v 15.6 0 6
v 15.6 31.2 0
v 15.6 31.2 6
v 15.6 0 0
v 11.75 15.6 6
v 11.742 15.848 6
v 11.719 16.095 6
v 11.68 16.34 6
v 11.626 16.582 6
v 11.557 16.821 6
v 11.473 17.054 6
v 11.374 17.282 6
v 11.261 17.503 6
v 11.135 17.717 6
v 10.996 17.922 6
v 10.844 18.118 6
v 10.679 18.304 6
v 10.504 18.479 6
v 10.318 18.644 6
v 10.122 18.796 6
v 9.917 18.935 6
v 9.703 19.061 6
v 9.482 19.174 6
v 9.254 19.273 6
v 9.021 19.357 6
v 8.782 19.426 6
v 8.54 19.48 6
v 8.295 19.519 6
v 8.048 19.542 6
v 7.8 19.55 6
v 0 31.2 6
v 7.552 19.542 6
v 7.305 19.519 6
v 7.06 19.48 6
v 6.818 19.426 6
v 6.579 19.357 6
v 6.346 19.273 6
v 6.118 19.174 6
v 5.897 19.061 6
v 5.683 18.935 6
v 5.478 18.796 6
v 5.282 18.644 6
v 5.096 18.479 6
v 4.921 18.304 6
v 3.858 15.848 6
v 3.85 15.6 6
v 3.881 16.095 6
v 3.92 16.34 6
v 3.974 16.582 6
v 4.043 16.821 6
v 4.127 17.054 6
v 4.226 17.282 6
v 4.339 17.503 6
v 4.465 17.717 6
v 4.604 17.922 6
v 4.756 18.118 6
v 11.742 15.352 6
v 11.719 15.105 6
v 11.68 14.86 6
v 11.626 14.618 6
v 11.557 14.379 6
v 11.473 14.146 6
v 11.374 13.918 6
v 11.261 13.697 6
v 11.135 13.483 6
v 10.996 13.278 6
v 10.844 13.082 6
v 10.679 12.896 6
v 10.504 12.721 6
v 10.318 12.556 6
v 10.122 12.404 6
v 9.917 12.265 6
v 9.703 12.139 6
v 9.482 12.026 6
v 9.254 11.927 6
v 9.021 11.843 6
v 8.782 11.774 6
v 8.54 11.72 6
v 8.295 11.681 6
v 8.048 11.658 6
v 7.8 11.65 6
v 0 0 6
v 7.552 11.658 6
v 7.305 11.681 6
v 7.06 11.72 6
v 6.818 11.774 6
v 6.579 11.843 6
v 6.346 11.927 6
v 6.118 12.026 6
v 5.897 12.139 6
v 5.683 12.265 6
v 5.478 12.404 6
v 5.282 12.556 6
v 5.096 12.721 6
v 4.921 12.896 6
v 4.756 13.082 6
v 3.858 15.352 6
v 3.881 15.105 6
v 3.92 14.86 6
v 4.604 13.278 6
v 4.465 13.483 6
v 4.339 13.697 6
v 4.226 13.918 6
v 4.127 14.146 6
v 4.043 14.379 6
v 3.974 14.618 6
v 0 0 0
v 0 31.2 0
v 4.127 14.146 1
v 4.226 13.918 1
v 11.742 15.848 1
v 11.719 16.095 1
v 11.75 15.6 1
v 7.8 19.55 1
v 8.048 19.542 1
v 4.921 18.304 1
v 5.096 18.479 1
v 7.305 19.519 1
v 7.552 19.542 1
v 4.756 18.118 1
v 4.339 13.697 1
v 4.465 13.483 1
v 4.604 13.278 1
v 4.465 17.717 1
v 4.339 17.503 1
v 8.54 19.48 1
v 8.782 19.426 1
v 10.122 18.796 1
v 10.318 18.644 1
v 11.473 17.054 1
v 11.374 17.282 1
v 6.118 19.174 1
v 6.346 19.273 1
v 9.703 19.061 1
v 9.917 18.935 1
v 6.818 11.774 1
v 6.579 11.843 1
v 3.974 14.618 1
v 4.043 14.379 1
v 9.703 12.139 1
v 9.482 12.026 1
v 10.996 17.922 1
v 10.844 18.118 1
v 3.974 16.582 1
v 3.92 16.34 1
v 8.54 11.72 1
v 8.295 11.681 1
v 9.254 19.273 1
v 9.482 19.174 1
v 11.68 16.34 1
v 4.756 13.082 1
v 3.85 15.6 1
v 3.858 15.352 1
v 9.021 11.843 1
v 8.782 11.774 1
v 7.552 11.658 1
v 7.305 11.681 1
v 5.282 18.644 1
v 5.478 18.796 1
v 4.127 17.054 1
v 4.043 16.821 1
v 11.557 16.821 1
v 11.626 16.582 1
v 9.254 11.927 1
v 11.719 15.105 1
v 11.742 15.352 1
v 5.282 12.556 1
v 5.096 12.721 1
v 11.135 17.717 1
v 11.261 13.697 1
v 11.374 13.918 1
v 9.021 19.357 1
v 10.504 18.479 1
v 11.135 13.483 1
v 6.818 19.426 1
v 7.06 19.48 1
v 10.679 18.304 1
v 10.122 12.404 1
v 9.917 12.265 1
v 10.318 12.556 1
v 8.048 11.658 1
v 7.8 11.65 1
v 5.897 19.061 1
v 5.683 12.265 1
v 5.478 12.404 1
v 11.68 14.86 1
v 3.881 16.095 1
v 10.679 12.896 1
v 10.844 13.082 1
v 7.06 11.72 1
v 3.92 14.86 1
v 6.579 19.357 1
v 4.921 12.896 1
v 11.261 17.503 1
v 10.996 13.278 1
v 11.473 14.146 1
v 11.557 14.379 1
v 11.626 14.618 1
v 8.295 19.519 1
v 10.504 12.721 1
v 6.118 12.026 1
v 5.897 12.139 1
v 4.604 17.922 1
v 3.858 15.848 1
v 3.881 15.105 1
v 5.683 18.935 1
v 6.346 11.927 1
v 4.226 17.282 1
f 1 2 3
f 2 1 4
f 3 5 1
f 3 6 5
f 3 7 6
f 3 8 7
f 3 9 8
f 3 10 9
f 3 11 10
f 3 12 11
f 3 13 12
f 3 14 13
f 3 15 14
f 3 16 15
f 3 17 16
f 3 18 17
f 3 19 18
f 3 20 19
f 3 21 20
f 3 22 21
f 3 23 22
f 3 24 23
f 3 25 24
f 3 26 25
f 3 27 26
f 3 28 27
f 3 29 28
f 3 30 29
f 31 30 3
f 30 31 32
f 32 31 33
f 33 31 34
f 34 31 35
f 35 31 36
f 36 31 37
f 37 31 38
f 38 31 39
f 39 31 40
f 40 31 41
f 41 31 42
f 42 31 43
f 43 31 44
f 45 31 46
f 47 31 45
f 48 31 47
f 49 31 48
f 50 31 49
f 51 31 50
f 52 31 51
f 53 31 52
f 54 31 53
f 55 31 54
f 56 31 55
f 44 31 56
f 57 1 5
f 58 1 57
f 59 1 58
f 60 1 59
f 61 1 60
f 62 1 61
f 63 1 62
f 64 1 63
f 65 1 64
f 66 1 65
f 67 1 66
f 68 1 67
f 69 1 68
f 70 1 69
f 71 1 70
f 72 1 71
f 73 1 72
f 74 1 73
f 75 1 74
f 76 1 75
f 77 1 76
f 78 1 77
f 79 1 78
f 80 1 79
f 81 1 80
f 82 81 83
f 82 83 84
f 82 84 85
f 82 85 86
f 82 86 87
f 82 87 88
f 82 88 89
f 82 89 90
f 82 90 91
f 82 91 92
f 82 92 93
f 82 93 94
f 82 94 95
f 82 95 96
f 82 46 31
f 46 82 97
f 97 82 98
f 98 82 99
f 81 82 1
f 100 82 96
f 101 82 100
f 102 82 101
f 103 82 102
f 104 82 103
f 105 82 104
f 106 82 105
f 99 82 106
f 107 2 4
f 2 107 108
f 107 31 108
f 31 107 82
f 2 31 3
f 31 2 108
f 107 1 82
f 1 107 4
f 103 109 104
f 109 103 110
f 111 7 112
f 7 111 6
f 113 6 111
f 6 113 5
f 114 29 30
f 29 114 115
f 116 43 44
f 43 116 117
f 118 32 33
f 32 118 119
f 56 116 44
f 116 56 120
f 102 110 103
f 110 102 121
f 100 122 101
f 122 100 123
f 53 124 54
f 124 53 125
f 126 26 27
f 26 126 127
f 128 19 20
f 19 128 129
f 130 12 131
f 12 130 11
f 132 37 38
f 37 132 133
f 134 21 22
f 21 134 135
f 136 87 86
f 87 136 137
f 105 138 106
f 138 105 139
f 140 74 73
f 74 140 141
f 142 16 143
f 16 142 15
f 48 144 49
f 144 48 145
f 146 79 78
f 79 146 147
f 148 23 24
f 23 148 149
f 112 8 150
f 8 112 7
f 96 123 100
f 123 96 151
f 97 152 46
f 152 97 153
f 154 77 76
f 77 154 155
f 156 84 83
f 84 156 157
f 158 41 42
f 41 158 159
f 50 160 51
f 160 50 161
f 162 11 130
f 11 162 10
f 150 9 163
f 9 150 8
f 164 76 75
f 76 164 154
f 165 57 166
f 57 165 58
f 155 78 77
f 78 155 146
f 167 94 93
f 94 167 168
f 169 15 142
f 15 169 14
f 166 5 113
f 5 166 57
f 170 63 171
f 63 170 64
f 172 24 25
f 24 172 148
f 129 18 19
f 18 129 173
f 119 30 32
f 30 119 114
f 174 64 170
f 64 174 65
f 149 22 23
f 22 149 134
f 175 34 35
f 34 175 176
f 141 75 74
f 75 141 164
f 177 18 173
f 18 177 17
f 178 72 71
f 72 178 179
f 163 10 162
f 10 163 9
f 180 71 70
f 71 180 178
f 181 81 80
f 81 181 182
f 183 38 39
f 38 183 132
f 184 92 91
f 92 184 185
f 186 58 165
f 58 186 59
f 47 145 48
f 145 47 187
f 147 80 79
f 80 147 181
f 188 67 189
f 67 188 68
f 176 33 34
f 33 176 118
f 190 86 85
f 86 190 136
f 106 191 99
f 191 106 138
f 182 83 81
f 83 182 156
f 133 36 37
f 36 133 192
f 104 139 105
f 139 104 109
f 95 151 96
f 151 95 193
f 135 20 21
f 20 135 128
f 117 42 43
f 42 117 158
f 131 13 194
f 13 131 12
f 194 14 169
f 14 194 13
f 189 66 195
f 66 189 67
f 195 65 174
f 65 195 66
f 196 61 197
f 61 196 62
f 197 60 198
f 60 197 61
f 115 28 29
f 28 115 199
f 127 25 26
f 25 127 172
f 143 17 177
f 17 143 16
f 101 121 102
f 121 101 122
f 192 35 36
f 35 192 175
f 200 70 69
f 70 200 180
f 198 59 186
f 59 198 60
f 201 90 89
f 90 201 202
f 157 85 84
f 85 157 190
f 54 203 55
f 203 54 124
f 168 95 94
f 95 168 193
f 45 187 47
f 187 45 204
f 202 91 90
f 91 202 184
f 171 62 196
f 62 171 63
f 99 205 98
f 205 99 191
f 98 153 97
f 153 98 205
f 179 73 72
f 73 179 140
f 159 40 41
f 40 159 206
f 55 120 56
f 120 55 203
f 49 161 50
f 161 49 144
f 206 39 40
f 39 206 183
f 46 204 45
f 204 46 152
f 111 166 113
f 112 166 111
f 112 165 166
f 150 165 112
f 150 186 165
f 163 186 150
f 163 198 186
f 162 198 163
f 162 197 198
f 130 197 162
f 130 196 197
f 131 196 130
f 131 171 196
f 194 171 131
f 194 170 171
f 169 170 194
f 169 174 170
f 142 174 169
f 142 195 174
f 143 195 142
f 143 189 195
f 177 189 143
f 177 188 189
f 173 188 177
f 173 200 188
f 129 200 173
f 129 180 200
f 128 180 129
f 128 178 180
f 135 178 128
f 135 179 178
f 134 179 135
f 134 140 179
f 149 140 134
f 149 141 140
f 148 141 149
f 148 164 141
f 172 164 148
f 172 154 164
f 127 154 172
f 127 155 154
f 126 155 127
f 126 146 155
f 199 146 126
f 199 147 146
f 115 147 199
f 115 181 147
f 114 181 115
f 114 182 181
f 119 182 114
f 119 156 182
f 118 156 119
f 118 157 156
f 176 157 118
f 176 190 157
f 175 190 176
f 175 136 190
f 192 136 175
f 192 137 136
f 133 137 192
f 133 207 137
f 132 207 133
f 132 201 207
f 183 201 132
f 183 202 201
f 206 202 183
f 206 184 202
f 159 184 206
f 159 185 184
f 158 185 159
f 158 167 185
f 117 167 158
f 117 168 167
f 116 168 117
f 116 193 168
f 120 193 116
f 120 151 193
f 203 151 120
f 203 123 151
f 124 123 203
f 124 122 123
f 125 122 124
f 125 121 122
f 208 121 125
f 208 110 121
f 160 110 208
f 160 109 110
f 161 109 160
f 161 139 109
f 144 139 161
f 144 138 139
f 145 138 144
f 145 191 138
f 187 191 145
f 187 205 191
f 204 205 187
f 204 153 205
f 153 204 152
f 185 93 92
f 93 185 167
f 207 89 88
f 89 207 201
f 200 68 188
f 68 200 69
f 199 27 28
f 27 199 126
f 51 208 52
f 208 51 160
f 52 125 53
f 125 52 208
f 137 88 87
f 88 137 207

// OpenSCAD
Width = 18.50;
Length = Width;
ScrewDiameter = 7.9;
SpacerWidth = 15.6; //Changed for SpacerJig()
SpacerLength=Double(SpacerWidth);
SpacerHeight=6;
WallThickness = (2.0); //Changed for SpacerJig()
function AddWall(length) = length + 4;
function Middle(length) = length/2;
function Double(value) = value*2;

module attachmentSpacer()
{
    difference()
    {

        cube([15.6, SpacerLength,SpacerHeight]);
        //translate(0,0,5)
        translate([Middle(SpacerWidth), Middle(SpacerLength),1])
            cylinder($fn=100,h=8,d1=ScrewDiameter,d2=ScrewDiameter,center=false);
    }
}

attachmentSpacer();
